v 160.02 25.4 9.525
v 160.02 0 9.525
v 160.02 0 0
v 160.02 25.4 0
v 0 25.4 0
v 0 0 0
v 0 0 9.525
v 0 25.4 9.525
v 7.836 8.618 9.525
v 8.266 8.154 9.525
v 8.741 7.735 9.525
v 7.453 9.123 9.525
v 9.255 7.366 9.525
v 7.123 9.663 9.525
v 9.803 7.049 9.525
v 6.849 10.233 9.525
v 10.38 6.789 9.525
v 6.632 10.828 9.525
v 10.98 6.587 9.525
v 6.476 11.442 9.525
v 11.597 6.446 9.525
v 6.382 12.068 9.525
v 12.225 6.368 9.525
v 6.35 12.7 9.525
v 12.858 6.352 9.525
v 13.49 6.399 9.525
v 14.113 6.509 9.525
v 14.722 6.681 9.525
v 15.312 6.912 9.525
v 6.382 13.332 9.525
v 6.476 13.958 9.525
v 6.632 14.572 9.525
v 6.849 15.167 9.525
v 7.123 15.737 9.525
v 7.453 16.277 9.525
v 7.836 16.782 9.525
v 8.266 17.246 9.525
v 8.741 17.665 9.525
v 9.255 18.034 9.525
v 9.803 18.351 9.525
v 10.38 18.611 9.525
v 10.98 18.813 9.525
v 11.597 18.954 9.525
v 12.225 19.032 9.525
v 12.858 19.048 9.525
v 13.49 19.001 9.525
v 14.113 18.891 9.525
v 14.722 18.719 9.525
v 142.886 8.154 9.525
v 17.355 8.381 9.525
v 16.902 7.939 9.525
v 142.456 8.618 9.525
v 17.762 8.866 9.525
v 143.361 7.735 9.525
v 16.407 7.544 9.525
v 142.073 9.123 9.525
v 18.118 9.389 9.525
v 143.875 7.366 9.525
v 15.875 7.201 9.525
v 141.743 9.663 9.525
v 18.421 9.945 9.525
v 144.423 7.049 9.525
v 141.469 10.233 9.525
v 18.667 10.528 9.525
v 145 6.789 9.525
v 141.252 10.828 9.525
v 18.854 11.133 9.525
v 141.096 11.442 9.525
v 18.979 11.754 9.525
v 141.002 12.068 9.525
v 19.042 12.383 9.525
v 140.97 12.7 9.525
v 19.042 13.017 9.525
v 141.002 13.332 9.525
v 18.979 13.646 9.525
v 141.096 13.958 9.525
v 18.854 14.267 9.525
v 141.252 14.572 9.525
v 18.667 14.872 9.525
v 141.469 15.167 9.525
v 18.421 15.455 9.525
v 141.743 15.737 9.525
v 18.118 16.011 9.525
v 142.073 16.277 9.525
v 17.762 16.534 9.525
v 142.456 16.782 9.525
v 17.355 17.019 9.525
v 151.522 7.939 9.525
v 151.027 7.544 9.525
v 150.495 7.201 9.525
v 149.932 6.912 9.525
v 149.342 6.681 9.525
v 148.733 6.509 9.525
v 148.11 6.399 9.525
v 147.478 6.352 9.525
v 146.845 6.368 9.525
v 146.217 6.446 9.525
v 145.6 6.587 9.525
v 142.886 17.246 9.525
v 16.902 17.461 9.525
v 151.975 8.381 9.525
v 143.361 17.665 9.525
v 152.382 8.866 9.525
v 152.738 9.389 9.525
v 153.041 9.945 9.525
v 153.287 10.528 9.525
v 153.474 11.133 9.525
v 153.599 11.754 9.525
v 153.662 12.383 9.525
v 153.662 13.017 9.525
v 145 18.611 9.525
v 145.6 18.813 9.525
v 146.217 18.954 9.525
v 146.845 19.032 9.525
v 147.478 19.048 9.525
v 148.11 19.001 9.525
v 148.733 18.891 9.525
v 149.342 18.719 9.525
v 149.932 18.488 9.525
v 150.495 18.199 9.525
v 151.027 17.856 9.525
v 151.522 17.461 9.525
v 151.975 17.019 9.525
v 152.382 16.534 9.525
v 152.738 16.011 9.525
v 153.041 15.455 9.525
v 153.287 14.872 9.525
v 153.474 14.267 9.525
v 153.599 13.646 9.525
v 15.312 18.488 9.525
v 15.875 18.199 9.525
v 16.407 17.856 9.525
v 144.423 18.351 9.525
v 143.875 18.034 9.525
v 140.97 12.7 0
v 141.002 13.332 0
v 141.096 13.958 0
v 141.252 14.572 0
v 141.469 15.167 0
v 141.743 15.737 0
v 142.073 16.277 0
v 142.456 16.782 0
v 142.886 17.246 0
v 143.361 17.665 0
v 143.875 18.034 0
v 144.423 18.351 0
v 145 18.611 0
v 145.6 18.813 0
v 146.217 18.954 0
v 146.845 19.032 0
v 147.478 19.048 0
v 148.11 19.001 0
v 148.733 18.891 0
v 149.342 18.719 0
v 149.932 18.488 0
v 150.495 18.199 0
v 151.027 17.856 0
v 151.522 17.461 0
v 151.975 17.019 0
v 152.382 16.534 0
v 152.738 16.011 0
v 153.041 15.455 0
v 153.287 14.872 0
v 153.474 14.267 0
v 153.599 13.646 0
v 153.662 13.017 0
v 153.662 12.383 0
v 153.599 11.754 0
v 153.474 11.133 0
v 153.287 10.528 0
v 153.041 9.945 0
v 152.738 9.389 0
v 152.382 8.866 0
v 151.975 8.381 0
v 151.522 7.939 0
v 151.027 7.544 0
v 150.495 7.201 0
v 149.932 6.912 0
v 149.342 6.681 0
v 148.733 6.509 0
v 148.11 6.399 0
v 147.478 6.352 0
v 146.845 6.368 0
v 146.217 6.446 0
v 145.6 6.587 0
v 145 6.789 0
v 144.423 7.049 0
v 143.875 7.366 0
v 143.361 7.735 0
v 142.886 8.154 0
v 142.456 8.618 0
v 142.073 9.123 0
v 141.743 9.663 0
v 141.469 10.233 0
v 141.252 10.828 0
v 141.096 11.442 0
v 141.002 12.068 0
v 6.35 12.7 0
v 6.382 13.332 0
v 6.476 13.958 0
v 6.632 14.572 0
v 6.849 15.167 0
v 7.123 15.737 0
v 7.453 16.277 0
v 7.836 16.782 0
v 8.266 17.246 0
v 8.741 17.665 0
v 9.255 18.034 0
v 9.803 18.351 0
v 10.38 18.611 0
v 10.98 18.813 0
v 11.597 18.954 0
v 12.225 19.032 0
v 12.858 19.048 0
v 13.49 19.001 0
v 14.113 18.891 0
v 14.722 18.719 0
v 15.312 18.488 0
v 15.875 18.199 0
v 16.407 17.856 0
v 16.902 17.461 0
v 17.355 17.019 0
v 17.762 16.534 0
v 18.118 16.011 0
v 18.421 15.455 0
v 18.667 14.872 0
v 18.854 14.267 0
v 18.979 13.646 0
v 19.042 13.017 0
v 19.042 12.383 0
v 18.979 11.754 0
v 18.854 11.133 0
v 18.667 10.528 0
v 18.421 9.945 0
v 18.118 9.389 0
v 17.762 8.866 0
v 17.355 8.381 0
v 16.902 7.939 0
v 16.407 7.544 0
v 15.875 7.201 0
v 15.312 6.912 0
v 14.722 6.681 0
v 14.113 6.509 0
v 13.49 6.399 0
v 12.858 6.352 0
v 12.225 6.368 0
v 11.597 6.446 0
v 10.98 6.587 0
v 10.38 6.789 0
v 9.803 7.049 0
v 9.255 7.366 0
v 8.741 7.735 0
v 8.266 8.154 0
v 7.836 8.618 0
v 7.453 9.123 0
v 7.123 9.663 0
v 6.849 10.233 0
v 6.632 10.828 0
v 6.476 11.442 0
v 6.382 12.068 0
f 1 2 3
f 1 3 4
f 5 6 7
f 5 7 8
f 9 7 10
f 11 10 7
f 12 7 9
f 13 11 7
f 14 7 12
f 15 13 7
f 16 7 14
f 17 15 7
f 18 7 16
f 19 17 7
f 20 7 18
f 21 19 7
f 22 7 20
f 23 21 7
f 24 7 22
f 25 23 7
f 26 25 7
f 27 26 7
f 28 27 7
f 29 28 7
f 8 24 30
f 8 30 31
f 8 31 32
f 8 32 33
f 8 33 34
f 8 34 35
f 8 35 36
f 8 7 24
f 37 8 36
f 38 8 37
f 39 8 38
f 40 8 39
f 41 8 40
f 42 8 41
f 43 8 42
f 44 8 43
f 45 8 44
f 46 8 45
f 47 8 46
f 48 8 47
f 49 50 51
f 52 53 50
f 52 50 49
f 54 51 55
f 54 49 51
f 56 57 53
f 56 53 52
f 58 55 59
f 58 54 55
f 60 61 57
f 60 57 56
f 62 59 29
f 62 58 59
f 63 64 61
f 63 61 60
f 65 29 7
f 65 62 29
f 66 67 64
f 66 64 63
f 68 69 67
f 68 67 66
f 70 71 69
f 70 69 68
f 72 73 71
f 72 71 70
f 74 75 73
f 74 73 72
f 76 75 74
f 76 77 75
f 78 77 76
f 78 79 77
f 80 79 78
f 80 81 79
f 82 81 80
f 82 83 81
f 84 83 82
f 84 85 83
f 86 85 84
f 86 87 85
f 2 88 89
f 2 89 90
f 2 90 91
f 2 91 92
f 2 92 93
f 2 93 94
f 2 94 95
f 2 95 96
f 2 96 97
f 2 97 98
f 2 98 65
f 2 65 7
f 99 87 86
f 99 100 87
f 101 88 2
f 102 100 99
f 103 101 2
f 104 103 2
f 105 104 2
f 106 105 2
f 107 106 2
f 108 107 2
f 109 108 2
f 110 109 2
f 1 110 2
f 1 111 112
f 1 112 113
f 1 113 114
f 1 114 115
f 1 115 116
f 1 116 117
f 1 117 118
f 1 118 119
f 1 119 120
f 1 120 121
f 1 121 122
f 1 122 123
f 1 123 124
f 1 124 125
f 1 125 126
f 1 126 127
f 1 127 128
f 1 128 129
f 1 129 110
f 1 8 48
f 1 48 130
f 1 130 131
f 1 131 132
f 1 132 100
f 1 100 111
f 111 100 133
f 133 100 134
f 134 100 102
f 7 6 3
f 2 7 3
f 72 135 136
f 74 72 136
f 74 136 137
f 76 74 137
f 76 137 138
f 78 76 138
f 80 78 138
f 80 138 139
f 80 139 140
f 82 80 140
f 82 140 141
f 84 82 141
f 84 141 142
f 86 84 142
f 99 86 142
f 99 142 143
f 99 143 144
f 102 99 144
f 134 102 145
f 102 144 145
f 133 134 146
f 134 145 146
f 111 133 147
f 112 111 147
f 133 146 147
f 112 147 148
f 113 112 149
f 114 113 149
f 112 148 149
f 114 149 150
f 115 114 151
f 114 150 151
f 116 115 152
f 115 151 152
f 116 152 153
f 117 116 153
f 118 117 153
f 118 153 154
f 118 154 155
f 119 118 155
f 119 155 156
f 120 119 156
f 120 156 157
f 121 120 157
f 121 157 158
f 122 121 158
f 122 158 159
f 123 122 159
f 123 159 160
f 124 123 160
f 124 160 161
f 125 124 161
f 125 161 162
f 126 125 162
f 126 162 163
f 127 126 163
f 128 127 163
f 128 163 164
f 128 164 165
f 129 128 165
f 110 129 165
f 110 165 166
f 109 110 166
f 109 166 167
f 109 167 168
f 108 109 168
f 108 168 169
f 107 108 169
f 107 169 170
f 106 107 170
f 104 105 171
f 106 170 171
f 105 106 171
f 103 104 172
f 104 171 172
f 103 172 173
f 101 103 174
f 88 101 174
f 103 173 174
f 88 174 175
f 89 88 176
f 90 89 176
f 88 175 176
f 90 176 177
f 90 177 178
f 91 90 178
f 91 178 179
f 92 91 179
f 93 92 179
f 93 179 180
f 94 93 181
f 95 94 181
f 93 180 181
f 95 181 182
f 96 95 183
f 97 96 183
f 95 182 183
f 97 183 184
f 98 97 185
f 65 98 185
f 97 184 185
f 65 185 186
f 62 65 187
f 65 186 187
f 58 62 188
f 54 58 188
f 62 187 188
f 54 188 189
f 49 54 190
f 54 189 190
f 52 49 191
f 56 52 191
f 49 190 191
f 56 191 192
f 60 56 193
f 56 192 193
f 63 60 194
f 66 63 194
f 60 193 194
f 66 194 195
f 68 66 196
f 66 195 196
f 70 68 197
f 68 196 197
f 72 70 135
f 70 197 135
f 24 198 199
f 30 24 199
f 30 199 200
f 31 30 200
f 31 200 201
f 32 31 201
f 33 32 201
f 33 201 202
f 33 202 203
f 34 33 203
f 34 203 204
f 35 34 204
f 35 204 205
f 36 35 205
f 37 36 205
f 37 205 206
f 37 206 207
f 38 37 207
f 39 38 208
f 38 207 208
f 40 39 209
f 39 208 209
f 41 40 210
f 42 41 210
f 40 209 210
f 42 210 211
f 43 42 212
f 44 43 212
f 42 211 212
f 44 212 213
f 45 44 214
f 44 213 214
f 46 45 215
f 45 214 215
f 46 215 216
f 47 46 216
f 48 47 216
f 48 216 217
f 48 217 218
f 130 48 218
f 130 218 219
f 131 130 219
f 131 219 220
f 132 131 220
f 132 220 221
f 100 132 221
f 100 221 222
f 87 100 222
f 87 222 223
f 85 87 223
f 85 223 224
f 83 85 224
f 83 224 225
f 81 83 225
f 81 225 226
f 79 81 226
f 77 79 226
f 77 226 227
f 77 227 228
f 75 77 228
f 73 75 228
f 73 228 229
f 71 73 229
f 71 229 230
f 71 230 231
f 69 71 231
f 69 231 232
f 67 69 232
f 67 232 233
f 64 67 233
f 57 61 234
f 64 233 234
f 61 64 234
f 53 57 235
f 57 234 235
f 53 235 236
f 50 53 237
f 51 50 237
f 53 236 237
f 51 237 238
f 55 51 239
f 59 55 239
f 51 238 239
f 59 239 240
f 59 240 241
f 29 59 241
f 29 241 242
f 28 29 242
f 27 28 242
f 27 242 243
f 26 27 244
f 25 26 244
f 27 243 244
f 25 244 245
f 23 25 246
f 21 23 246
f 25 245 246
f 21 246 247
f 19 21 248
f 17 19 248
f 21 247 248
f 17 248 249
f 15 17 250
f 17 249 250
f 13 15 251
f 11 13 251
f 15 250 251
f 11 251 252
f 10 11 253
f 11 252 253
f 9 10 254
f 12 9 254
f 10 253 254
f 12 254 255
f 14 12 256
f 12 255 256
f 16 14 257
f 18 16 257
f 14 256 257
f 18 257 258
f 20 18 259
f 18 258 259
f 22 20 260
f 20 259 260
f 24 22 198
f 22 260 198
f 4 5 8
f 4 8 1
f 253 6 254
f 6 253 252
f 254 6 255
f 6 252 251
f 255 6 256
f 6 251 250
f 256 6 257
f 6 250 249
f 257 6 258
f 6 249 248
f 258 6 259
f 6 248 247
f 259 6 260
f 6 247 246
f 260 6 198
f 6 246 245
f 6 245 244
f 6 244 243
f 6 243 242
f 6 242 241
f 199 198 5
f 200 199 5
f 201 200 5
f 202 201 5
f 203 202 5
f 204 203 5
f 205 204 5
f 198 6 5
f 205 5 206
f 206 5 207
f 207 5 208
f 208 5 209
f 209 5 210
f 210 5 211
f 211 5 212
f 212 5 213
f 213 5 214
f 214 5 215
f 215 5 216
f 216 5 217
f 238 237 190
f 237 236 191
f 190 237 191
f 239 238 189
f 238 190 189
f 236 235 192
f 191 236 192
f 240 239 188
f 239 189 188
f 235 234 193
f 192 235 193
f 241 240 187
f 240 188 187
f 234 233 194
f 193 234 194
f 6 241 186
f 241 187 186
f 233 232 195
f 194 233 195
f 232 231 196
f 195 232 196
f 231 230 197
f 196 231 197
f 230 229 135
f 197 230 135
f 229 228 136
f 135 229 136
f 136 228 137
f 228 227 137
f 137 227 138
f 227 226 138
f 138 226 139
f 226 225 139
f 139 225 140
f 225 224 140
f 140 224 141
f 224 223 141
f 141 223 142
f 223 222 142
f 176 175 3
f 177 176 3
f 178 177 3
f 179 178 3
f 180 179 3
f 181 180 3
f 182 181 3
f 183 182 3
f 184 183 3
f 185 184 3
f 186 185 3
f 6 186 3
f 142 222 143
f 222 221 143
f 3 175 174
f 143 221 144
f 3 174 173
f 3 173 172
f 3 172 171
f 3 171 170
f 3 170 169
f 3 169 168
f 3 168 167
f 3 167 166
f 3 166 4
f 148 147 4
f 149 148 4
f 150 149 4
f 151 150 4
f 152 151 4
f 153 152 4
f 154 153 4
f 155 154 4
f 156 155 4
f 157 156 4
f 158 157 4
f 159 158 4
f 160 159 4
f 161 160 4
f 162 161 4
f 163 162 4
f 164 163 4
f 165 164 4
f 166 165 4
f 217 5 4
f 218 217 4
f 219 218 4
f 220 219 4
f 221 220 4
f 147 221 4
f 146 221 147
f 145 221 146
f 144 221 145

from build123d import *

# Parameters (mm, degrees)
SKETCH1_W                  = 177.8
SKETCH1_H                  = 25.4
BOSS_EXTRUDE1_DEPTH        = 9.525
F_1_2_0_5_DIAMETER_HOLE1_D = 12.7
SKETCH6_W                  = 17.78
SKETCH6_H                  = 25.4
CUT_EXTRUDE2_DEPTH         = 180.857514786


with BuildPart() as part:
    # Sketch1 → Boss-Extrude1 (new body)
    with BuildSketch(Plane.XY):
        with Locations((88.9, 12.7)):
            Rectangle(SKETCH1_W, SKETCH1_H)
    extrude(amount=BOSS_EXTRUDE1_DEPTH)

    # 1/2 (0.5) Diameter Hole1 (through all)
    with Locations(Plane.XY.offset(9.525)):
        with Locations((12.7, 12.7), (147.32, 12.7)):
            Hole(F_1_2_0_5_DIAMETER_HOLE1_D / 2)

    # Sketch6 → Cut-Extrude2 (cut, through all)
    with BuildSketch(Plane.XY.offset(9.525)):
        with Locations((168.91, 12.7)):
            Rectangle(SKETCH6_W, SKETCH6_H)
    extrude(amount=-CUT_EXTRUDE2_DEPTH, mode=Mode.SUBTRACT)


solid = part.part
